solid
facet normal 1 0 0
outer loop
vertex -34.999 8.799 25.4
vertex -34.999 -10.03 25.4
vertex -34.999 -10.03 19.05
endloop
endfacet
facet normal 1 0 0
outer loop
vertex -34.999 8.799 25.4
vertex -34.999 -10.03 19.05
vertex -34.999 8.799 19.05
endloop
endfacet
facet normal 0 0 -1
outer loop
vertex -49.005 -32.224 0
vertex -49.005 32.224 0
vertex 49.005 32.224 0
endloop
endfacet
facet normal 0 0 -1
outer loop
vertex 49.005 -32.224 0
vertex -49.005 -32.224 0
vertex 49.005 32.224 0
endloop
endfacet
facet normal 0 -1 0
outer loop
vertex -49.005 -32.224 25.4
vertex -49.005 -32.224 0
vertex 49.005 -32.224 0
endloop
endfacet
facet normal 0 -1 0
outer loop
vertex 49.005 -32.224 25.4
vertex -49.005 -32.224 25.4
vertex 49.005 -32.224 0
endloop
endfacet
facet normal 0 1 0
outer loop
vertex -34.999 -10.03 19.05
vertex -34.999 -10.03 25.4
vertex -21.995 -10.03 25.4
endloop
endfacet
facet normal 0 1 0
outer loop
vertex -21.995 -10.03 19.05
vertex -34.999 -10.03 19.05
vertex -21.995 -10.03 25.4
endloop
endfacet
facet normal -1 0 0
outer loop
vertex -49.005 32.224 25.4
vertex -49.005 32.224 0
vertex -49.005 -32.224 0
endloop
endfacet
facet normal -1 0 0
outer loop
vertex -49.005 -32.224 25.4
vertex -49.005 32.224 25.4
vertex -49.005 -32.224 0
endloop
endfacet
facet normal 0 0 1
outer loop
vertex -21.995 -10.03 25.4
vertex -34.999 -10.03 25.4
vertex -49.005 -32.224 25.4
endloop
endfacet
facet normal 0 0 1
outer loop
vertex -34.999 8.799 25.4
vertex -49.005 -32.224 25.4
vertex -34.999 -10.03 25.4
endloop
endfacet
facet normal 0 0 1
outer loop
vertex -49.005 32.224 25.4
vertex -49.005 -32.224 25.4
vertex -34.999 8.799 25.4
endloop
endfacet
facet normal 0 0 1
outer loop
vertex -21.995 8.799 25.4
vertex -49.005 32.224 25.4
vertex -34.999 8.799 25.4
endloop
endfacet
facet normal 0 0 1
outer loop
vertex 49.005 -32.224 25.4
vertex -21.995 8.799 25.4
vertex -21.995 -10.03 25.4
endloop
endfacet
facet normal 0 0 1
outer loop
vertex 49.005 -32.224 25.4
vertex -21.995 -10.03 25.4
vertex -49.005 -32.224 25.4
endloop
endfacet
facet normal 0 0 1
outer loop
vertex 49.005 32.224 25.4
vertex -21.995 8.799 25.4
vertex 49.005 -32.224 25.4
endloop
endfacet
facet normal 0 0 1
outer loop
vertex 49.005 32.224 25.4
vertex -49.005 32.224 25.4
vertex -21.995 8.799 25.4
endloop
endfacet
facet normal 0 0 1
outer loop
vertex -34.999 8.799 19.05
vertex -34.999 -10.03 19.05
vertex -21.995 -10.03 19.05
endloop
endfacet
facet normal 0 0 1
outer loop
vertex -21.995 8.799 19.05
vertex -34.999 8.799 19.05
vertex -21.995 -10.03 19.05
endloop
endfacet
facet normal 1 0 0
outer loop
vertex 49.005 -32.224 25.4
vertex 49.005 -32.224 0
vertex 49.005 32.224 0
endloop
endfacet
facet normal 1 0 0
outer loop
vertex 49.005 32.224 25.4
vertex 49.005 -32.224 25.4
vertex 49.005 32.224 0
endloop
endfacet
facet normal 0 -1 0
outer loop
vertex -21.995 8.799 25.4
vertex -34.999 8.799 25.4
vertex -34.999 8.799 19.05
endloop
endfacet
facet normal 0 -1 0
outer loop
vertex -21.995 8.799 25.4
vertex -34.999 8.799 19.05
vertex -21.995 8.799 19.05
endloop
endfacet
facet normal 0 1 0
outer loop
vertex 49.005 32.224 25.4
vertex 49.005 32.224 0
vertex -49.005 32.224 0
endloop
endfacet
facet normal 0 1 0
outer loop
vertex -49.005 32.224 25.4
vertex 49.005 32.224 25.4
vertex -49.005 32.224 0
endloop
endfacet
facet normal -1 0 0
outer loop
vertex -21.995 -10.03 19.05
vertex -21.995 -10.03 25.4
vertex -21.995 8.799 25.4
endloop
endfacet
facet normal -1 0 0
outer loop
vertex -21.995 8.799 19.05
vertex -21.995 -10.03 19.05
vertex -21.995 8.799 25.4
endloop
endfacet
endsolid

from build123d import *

# Parameters (mm, degrees)
F1_DEPTH = 25.4
F2_W     = 13.004002
F2_H     = 18.828773
F3_DEPTH = 6.35


with BuildPart() as f1:
    # F0 (on Top) → F1 (new body)
    with BuildSketch(Plane.XY):
        Polygon((-49.004722, 32.224186), (-49.004722, -32.224186), (49.004722, -32.224186), (49.004722, 32.224186), (25.007728, 32.224186), (-25.007728, 32.224186), align=None)
    extrude(amount=F1_DEPTH)

    # F2 (on face) → F3 (cut)
    with BuildSketch(Plane.XY.offset(25.4)):
        with Locations((-28.497411, -0.615601)):
            Rectangle(F2_W, F2_H)
    extrude(amount=-F3_DEPTH, mode=Mode.SUBTRACT)


solid = f1.part
